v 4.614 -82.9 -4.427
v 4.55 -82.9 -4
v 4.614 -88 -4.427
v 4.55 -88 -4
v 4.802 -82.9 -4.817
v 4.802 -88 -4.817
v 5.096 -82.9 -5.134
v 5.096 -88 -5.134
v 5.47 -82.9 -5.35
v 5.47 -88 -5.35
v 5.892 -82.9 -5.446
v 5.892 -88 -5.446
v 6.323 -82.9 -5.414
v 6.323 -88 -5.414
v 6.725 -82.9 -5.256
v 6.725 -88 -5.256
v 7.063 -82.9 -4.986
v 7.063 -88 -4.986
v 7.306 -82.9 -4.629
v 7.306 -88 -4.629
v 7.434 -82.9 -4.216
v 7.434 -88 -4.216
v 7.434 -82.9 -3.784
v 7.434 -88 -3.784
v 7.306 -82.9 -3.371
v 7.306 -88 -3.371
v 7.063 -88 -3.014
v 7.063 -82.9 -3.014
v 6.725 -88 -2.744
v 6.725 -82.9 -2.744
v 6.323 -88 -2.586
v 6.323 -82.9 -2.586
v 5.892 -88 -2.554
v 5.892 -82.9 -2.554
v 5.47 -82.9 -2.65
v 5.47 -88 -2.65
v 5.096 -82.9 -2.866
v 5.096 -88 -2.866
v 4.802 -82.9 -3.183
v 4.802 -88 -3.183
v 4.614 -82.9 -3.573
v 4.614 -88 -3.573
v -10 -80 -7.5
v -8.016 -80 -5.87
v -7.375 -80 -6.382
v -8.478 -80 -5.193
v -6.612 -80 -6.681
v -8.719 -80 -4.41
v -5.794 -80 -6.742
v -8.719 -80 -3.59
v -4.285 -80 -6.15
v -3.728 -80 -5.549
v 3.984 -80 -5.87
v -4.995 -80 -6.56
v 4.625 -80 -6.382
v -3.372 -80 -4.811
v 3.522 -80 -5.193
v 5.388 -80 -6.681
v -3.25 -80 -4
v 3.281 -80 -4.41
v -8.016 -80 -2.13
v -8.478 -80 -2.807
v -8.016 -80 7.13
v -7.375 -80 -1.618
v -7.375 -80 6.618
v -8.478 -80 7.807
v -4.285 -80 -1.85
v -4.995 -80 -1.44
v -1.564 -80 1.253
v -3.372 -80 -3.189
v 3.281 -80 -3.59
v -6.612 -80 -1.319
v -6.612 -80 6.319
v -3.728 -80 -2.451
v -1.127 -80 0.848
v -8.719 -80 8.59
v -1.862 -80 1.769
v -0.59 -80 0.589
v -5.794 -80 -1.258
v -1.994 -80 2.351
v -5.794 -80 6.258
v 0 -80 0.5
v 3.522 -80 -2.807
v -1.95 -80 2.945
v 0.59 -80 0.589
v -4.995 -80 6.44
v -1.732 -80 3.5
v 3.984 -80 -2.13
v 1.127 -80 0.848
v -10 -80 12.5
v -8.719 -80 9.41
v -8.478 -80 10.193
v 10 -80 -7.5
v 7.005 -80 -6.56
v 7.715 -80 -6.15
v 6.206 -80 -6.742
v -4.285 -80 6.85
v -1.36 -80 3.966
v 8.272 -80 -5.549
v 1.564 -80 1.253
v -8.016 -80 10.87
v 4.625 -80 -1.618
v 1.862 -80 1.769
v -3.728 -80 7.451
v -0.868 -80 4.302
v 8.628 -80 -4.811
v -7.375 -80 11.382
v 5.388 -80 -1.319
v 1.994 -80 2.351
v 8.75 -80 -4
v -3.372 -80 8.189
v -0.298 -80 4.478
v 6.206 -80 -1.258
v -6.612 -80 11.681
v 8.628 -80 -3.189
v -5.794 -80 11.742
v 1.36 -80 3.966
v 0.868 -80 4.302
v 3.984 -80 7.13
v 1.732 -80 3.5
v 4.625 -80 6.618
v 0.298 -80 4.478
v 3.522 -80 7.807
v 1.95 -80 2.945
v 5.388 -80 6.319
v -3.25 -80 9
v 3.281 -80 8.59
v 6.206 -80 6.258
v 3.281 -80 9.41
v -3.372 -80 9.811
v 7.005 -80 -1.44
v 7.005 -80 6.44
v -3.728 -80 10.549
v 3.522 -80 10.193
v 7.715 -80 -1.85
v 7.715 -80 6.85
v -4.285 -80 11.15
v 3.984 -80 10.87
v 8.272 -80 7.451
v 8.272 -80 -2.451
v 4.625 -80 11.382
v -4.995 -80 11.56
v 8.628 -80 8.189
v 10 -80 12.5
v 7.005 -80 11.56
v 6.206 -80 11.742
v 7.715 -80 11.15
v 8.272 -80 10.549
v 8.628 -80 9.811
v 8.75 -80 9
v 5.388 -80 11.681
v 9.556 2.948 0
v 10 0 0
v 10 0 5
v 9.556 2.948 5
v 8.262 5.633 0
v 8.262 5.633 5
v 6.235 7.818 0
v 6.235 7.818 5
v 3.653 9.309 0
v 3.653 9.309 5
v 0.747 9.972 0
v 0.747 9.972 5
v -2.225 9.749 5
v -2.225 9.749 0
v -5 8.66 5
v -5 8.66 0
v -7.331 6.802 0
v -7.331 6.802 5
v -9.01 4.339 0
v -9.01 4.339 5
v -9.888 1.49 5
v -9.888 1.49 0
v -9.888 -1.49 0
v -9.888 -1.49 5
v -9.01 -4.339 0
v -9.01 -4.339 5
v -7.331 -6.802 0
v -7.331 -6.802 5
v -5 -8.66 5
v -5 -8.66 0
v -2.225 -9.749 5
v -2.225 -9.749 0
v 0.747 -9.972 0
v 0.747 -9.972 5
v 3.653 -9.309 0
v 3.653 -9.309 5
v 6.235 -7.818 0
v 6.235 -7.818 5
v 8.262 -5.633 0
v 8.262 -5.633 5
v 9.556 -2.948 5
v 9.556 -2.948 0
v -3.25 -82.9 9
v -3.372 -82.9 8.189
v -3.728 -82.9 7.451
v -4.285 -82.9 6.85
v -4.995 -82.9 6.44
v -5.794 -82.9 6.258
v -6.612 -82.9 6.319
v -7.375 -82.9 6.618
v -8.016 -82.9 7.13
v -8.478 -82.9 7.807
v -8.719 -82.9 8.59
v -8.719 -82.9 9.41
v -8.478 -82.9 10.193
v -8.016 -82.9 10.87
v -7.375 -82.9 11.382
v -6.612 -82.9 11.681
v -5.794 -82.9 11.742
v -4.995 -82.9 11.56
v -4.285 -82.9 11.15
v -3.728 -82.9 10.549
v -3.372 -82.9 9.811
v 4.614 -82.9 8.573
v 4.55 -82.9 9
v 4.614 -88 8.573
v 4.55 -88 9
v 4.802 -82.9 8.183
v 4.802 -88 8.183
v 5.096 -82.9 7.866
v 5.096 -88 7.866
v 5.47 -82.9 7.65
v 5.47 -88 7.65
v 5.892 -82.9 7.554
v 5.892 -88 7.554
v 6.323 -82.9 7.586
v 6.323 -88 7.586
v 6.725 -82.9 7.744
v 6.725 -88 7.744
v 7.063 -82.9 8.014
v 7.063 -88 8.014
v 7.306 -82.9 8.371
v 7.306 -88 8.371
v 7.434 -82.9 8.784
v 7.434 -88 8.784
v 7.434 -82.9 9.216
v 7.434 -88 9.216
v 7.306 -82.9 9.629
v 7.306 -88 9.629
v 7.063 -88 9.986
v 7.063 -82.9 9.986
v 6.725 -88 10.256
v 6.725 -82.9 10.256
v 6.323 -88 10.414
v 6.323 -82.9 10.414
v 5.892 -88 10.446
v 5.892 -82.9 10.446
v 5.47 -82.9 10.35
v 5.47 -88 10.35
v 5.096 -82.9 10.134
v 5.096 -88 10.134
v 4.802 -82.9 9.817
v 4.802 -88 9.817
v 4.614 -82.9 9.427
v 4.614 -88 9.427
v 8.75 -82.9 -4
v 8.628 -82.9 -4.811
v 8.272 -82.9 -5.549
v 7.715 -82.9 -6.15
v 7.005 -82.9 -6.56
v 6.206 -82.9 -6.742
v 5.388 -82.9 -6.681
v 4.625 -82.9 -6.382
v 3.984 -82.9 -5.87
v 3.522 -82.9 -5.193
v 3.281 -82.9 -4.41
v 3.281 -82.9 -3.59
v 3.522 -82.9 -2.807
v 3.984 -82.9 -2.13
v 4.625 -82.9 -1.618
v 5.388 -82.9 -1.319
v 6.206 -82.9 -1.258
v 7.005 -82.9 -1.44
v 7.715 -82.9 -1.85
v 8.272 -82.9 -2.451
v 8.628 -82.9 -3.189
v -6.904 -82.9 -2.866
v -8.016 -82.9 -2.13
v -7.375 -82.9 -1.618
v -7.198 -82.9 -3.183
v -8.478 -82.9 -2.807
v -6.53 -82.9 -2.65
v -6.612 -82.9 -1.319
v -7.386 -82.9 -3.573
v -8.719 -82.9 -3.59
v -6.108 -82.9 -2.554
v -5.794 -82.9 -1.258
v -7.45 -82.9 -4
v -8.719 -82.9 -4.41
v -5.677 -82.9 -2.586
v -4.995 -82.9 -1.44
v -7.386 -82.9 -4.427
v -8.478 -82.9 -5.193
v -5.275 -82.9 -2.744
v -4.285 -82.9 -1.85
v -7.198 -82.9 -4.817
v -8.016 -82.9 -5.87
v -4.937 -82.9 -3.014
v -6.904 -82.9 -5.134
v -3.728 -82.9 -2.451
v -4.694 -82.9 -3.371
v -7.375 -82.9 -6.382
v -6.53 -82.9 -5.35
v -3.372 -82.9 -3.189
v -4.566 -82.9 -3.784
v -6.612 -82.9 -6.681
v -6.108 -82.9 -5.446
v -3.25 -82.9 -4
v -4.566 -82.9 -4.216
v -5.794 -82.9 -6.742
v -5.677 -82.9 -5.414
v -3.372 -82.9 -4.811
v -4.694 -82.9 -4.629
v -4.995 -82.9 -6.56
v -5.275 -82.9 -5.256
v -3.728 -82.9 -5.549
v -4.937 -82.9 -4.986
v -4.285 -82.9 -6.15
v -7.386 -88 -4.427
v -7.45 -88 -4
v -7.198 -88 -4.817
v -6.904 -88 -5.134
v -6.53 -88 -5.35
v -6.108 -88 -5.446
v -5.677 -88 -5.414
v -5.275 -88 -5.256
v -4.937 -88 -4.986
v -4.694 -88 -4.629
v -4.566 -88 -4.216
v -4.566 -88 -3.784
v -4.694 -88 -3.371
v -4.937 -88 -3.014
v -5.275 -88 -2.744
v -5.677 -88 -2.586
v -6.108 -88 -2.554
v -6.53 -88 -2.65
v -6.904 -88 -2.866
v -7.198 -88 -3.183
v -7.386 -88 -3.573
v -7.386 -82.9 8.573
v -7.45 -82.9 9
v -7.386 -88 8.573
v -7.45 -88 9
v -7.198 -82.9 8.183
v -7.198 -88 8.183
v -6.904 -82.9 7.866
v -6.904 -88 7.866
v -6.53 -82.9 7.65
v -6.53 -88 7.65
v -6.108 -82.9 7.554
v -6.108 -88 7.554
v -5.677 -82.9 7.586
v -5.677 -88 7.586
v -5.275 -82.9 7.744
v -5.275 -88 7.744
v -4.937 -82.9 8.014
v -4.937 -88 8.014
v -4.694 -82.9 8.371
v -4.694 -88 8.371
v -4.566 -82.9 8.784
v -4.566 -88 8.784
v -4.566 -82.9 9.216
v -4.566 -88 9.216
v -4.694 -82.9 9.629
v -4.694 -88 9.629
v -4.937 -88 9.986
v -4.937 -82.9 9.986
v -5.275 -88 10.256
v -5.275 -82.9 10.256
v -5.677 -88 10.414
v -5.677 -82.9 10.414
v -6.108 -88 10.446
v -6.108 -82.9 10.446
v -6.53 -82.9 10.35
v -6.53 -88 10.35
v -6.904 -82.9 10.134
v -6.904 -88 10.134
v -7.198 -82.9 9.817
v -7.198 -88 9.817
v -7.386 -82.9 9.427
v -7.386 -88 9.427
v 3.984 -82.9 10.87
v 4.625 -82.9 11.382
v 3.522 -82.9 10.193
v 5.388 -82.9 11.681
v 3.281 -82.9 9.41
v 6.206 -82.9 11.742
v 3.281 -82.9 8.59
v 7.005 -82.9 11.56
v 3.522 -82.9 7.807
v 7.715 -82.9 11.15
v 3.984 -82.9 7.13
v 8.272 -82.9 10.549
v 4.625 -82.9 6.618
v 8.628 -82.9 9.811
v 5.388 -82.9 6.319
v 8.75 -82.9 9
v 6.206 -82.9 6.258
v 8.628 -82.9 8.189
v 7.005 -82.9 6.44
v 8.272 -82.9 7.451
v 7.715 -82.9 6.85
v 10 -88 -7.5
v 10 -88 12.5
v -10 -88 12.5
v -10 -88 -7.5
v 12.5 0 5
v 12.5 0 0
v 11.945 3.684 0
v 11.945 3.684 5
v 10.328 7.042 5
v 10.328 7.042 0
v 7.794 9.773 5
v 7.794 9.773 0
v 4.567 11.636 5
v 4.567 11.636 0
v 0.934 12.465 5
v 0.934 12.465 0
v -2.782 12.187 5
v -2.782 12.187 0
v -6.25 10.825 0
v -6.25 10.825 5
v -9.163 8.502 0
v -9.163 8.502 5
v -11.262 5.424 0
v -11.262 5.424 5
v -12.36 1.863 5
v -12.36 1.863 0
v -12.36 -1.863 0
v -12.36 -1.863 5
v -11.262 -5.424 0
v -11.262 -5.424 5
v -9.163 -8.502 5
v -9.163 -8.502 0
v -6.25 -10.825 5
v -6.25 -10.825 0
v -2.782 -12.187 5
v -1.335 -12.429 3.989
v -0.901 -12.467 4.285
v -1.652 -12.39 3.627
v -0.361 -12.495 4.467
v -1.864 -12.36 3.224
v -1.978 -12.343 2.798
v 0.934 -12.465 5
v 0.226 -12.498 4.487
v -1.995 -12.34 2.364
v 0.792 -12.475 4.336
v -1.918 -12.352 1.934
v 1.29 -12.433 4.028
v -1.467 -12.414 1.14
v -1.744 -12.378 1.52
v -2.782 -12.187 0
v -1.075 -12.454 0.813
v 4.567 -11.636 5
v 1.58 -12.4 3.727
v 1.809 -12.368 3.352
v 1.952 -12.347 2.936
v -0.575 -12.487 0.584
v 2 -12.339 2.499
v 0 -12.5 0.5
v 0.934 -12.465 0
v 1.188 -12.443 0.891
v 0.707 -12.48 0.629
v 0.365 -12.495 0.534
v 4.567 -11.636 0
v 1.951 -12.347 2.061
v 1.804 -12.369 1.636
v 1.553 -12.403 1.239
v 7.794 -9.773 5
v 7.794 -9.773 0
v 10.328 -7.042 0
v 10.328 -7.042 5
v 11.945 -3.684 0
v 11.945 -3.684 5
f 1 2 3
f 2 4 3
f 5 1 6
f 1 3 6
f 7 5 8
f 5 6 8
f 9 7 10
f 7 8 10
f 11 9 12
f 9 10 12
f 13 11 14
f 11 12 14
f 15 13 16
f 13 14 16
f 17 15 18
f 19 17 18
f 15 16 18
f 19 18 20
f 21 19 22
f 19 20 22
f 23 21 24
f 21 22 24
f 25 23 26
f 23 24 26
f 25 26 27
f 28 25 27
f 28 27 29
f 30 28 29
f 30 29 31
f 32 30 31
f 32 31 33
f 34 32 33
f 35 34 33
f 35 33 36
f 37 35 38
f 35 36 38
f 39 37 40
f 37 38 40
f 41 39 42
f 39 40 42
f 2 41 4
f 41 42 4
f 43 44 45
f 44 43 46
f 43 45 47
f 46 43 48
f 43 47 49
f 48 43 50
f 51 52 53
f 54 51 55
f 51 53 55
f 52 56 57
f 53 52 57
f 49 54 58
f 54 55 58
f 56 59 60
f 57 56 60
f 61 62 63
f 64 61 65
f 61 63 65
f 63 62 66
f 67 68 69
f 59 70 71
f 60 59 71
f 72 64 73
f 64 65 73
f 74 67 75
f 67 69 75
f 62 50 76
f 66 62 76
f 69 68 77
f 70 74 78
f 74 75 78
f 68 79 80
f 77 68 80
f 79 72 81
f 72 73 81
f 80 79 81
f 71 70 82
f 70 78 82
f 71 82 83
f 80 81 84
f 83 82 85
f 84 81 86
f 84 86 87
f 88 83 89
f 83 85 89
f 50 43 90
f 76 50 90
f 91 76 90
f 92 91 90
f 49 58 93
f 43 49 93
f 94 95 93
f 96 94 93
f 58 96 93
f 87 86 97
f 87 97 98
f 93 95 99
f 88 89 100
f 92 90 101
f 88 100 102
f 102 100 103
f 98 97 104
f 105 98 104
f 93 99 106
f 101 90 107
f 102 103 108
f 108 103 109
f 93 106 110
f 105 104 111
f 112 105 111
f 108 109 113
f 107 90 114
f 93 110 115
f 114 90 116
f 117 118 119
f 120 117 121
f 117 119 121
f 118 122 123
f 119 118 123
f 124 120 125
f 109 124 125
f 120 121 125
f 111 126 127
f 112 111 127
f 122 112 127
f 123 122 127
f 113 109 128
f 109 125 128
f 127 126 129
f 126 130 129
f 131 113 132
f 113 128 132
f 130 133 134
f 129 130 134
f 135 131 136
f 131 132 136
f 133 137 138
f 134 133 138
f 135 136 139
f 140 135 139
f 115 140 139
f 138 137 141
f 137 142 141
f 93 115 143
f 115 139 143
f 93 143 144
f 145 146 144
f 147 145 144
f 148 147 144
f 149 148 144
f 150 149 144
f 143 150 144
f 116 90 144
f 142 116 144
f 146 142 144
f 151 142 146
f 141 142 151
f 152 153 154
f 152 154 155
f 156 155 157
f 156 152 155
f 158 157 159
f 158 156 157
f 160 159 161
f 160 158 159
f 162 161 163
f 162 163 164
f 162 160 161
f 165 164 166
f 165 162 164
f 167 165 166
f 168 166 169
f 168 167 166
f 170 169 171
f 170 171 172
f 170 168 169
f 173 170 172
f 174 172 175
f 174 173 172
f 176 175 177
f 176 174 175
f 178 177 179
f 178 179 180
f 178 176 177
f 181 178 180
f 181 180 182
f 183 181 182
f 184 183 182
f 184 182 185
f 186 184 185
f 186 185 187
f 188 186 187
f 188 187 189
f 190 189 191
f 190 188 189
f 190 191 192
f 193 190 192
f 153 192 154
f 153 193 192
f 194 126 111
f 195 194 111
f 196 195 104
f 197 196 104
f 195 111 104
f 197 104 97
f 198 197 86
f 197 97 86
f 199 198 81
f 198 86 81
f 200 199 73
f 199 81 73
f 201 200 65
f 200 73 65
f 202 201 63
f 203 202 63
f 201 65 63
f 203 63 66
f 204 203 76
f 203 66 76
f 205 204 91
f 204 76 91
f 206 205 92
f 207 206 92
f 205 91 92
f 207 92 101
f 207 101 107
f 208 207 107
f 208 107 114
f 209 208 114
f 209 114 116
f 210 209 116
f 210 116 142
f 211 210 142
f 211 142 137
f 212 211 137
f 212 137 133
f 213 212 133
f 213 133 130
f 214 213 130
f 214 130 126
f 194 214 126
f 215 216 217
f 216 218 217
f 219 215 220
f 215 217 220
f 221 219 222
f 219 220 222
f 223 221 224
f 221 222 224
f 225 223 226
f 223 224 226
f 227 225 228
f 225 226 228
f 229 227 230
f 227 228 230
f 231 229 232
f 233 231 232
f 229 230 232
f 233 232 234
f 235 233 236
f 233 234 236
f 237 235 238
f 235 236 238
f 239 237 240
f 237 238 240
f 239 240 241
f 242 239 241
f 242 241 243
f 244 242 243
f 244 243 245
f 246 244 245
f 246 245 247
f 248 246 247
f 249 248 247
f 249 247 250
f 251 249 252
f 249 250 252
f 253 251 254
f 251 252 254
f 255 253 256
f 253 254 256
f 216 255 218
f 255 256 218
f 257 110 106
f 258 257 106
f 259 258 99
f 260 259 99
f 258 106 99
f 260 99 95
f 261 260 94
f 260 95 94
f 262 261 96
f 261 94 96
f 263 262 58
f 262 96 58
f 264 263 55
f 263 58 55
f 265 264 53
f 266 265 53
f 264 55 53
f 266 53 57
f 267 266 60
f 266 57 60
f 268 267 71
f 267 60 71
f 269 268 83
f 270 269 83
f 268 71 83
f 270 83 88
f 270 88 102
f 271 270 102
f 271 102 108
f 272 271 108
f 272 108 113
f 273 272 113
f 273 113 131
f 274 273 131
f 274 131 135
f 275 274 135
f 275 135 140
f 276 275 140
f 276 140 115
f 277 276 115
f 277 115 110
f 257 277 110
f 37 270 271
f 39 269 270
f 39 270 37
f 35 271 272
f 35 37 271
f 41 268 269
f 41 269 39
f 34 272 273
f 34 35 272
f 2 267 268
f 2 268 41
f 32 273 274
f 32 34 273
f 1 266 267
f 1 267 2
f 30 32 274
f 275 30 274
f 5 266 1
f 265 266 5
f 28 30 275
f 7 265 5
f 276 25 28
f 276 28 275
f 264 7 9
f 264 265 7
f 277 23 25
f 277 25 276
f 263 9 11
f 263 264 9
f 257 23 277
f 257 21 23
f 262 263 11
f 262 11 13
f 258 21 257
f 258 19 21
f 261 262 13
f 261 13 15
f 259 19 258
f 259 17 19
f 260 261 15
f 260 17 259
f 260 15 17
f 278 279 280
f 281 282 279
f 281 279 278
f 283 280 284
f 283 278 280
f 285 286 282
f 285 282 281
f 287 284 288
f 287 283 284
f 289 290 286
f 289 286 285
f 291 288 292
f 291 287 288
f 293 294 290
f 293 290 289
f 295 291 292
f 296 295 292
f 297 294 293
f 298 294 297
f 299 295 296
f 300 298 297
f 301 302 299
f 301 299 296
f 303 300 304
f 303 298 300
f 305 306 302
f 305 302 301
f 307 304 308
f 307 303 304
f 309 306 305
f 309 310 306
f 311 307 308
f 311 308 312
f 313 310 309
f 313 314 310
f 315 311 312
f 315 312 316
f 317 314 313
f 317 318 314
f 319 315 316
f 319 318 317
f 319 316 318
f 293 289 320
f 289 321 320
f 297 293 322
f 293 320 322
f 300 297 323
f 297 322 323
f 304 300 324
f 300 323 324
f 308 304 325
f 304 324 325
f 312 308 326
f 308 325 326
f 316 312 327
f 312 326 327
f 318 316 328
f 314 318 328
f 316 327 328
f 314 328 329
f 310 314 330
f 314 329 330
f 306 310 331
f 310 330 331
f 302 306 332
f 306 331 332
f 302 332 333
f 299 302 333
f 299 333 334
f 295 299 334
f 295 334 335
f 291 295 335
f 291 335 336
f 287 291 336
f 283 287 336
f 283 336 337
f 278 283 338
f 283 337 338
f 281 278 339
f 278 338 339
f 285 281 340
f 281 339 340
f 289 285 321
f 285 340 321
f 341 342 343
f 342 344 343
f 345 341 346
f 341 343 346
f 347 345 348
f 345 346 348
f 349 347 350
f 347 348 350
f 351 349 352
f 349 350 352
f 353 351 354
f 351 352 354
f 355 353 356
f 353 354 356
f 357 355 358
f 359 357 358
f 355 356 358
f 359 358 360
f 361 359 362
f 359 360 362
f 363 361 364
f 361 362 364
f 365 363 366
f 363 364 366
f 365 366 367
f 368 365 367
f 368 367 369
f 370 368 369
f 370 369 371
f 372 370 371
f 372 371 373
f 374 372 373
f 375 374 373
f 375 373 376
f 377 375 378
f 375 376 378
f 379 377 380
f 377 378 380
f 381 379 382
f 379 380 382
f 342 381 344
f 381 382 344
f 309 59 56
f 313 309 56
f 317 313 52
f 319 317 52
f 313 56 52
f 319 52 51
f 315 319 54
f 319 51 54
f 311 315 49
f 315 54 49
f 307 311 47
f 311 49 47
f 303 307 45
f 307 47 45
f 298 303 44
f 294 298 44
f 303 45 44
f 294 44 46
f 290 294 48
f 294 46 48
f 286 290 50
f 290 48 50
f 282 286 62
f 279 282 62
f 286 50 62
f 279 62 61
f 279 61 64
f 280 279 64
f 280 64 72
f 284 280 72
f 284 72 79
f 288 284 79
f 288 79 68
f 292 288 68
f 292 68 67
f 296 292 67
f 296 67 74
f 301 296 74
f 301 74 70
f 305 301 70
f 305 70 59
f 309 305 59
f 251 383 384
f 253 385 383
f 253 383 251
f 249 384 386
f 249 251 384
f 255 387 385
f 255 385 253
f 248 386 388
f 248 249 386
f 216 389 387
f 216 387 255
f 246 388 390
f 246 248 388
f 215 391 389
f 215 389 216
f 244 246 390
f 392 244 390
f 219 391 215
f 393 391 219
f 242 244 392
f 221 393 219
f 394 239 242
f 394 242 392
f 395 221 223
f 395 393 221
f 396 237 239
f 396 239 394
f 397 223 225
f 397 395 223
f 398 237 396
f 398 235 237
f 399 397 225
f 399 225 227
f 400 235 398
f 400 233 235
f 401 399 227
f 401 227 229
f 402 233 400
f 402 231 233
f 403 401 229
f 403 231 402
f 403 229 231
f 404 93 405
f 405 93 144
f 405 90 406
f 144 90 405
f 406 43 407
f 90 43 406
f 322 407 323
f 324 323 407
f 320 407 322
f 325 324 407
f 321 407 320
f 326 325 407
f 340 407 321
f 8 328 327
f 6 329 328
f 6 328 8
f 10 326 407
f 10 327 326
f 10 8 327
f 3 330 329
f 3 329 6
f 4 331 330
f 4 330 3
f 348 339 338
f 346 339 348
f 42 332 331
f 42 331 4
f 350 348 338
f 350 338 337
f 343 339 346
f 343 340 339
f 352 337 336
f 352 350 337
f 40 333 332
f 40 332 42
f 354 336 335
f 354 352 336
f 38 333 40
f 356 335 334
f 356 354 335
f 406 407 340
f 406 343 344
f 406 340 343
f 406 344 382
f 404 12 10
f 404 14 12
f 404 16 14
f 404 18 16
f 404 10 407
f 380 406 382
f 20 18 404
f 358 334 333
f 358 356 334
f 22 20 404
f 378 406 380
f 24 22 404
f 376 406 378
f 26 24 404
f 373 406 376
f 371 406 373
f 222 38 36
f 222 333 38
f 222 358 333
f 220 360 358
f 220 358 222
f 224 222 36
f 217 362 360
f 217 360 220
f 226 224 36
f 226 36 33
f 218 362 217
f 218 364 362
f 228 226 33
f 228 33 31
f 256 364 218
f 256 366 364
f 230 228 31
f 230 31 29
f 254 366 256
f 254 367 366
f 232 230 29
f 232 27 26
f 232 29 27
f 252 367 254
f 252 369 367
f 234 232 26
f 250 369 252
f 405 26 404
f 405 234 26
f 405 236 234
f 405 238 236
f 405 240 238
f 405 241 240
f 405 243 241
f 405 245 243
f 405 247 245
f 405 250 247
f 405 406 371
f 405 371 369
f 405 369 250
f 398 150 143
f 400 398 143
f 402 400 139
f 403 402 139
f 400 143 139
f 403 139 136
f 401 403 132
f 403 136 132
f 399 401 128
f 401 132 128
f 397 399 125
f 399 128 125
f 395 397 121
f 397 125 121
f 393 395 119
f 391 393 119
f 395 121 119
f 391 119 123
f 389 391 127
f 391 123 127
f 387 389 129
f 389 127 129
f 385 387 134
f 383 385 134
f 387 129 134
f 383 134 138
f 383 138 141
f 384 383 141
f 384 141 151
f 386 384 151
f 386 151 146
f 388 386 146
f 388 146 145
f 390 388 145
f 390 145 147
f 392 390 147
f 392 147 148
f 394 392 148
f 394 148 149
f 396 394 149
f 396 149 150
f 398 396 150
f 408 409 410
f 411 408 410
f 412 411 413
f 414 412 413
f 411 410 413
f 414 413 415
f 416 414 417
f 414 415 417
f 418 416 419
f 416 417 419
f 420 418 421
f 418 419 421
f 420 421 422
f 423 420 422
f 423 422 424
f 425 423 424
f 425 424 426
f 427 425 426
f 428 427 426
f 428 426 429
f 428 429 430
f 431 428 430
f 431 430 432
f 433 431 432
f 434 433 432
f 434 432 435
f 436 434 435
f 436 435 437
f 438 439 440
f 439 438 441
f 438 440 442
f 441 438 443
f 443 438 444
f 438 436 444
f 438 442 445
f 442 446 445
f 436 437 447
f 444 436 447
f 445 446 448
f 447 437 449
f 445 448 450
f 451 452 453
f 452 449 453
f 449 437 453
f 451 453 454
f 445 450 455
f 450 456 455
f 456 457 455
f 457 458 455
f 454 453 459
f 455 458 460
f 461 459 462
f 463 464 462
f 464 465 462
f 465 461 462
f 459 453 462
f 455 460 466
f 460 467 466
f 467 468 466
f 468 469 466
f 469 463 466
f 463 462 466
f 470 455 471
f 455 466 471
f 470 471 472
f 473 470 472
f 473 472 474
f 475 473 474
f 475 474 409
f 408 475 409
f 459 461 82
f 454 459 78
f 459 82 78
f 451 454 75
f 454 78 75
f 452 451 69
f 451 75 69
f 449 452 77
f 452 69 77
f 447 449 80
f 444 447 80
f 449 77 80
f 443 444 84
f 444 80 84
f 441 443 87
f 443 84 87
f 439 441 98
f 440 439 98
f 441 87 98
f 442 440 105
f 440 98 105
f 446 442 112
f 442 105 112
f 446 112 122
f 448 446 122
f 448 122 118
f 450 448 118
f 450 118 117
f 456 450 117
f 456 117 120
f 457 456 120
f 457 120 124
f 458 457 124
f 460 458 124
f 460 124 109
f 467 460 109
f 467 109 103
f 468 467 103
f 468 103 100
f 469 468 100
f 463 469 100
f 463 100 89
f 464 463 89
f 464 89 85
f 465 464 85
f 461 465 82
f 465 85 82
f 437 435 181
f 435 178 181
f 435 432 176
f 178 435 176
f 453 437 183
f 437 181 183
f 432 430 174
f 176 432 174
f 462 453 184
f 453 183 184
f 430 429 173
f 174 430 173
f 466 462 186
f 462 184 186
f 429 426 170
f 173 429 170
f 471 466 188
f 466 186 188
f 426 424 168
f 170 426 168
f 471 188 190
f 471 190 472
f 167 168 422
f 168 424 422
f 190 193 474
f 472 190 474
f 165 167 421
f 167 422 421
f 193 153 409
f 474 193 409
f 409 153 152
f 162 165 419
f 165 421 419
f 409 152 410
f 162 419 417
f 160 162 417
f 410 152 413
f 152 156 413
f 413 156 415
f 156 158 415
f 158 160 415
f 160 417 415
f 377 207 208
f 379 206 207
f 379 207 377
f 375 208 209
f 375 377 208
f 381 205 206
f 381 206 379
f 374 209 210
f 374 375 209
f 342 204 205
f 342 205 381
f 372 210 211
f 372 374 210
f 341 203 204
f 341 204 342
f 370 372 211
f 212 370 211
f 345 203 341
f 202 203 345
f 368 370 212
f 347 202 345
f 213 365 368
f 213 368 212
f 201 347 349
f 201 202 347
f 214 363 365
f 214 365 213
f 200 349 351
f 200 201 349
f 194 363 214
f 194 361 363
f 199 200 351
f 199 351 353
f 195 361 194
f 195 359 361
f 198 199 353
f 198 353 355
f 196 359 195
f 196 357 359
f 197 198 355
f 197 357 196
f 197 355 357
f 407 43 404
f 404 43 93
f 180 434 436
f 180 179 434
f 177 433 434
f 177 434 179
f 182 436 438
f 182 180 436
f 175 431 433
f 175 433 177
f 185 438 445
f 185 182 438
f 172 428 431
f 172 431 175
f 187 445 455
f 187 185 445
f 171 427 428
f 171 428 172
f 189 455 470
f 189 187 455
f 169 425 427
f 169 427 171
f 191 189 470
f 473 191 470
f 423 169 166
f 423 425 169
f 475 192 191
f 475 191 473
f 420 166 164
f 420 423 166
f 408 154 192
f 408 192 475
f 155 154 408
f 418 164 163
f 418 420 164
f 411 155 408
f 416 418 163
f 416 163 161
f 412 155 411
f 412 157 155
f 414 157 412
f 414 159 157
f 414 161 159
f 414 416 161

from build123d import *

# Parameters (mm, degrees)
SKETCH_1_R                     = 12.5
SKETCH_1_R_2                   = 10
EXTRUDE_1_DEPTH                = 5
EXTRUDE_2_REACH                = 95.475
EXTRUDE_2_END_RADIUS           = 12.5
SKETCH_2_R                     = 2
SKETCH_3_W                     = 20
SKETCH_3_H                     = 20
EXTRUDE_3_DEPTH                = 8
HOLE_WIZARD_M2_5_1_D           = 2.9
HOLE_WIZARD_M2_5_1_CBORE_D     = 5.5
HOLE_WIZARD_M2_5_1_CBORE_DEPTH = 2.9


with BuildPart() as part:
    # 草图1 → 凸台-拉伸1 (new body)
    with BuildSketch(Plane.XY):
        Circle(SKETCH_1_R)
        Circle(SKETCH_1_R_2, mode=Mode.SUBTRACT)
    extrude(amount=EXTRUDE_1_DEPTH)

    # 凸台-拉伸2: up to this cylinder (the profile starts outside it)
    extrude_2_end = Plane(origin=(0, 0, 2.5), z_dir=(0, 0, -1)) * Cylinder(EXTRUDE_2_END_RADIUS, 216.95, mode=Mode.PRIVATE)
    # 草图2 → 凸台-拉伸2 (add, up to the surface)
    with BuildSketch(Plane(origin=(0, -80, 0), x_dir=(1, 0, 0), z_dir=(0, 1, 0)), mode=Mode.PRIVATE) as extrude_2_sk1:
        with Locations(Location((0, -2.5, 0), (0, 0, 90))):
            Circle(SKETCH_2_R)
    extrude_2_tool1 = extrude(extrude_2_sk1.sketch, amount=EXTRUDE_2_REACH, mode=Mode.PRIVATE) - extrude_2_end
    add(extrude_2_tool1.solids().sort_by_distance((0, -80, 2.5))[0])

    # 草图3 → 凸台-拉伸3 (add)
    with BuildSketch(Plane.XZ.offset(80)):
        with Locations((0, 2.5)):
            Rectangle(SKETCH_3_W, SKETCH_3_H)
    extrude(amount=EXTRUDE_3_DEPTH)

    # M2.5 六角凹头螺钉的柱形沉头孔1 (through all)
    with Locations(Plane(origin=(0, -80, 0), x_dir=(1, 0, 0), z_dir=(0, 1, 0))):
        with Locations((-6, 4), (6, 4), (6, -9), (-6, -9)):
            CounterBoreHole(HOLE_WIZARD_M2_5_1_D / 2, HOLE_WIZARD_M2_5_1_CBORE_D / 2, HOLE_WIZARD_M2_5_1_CBORE_DEPTH)


solid = part.part
